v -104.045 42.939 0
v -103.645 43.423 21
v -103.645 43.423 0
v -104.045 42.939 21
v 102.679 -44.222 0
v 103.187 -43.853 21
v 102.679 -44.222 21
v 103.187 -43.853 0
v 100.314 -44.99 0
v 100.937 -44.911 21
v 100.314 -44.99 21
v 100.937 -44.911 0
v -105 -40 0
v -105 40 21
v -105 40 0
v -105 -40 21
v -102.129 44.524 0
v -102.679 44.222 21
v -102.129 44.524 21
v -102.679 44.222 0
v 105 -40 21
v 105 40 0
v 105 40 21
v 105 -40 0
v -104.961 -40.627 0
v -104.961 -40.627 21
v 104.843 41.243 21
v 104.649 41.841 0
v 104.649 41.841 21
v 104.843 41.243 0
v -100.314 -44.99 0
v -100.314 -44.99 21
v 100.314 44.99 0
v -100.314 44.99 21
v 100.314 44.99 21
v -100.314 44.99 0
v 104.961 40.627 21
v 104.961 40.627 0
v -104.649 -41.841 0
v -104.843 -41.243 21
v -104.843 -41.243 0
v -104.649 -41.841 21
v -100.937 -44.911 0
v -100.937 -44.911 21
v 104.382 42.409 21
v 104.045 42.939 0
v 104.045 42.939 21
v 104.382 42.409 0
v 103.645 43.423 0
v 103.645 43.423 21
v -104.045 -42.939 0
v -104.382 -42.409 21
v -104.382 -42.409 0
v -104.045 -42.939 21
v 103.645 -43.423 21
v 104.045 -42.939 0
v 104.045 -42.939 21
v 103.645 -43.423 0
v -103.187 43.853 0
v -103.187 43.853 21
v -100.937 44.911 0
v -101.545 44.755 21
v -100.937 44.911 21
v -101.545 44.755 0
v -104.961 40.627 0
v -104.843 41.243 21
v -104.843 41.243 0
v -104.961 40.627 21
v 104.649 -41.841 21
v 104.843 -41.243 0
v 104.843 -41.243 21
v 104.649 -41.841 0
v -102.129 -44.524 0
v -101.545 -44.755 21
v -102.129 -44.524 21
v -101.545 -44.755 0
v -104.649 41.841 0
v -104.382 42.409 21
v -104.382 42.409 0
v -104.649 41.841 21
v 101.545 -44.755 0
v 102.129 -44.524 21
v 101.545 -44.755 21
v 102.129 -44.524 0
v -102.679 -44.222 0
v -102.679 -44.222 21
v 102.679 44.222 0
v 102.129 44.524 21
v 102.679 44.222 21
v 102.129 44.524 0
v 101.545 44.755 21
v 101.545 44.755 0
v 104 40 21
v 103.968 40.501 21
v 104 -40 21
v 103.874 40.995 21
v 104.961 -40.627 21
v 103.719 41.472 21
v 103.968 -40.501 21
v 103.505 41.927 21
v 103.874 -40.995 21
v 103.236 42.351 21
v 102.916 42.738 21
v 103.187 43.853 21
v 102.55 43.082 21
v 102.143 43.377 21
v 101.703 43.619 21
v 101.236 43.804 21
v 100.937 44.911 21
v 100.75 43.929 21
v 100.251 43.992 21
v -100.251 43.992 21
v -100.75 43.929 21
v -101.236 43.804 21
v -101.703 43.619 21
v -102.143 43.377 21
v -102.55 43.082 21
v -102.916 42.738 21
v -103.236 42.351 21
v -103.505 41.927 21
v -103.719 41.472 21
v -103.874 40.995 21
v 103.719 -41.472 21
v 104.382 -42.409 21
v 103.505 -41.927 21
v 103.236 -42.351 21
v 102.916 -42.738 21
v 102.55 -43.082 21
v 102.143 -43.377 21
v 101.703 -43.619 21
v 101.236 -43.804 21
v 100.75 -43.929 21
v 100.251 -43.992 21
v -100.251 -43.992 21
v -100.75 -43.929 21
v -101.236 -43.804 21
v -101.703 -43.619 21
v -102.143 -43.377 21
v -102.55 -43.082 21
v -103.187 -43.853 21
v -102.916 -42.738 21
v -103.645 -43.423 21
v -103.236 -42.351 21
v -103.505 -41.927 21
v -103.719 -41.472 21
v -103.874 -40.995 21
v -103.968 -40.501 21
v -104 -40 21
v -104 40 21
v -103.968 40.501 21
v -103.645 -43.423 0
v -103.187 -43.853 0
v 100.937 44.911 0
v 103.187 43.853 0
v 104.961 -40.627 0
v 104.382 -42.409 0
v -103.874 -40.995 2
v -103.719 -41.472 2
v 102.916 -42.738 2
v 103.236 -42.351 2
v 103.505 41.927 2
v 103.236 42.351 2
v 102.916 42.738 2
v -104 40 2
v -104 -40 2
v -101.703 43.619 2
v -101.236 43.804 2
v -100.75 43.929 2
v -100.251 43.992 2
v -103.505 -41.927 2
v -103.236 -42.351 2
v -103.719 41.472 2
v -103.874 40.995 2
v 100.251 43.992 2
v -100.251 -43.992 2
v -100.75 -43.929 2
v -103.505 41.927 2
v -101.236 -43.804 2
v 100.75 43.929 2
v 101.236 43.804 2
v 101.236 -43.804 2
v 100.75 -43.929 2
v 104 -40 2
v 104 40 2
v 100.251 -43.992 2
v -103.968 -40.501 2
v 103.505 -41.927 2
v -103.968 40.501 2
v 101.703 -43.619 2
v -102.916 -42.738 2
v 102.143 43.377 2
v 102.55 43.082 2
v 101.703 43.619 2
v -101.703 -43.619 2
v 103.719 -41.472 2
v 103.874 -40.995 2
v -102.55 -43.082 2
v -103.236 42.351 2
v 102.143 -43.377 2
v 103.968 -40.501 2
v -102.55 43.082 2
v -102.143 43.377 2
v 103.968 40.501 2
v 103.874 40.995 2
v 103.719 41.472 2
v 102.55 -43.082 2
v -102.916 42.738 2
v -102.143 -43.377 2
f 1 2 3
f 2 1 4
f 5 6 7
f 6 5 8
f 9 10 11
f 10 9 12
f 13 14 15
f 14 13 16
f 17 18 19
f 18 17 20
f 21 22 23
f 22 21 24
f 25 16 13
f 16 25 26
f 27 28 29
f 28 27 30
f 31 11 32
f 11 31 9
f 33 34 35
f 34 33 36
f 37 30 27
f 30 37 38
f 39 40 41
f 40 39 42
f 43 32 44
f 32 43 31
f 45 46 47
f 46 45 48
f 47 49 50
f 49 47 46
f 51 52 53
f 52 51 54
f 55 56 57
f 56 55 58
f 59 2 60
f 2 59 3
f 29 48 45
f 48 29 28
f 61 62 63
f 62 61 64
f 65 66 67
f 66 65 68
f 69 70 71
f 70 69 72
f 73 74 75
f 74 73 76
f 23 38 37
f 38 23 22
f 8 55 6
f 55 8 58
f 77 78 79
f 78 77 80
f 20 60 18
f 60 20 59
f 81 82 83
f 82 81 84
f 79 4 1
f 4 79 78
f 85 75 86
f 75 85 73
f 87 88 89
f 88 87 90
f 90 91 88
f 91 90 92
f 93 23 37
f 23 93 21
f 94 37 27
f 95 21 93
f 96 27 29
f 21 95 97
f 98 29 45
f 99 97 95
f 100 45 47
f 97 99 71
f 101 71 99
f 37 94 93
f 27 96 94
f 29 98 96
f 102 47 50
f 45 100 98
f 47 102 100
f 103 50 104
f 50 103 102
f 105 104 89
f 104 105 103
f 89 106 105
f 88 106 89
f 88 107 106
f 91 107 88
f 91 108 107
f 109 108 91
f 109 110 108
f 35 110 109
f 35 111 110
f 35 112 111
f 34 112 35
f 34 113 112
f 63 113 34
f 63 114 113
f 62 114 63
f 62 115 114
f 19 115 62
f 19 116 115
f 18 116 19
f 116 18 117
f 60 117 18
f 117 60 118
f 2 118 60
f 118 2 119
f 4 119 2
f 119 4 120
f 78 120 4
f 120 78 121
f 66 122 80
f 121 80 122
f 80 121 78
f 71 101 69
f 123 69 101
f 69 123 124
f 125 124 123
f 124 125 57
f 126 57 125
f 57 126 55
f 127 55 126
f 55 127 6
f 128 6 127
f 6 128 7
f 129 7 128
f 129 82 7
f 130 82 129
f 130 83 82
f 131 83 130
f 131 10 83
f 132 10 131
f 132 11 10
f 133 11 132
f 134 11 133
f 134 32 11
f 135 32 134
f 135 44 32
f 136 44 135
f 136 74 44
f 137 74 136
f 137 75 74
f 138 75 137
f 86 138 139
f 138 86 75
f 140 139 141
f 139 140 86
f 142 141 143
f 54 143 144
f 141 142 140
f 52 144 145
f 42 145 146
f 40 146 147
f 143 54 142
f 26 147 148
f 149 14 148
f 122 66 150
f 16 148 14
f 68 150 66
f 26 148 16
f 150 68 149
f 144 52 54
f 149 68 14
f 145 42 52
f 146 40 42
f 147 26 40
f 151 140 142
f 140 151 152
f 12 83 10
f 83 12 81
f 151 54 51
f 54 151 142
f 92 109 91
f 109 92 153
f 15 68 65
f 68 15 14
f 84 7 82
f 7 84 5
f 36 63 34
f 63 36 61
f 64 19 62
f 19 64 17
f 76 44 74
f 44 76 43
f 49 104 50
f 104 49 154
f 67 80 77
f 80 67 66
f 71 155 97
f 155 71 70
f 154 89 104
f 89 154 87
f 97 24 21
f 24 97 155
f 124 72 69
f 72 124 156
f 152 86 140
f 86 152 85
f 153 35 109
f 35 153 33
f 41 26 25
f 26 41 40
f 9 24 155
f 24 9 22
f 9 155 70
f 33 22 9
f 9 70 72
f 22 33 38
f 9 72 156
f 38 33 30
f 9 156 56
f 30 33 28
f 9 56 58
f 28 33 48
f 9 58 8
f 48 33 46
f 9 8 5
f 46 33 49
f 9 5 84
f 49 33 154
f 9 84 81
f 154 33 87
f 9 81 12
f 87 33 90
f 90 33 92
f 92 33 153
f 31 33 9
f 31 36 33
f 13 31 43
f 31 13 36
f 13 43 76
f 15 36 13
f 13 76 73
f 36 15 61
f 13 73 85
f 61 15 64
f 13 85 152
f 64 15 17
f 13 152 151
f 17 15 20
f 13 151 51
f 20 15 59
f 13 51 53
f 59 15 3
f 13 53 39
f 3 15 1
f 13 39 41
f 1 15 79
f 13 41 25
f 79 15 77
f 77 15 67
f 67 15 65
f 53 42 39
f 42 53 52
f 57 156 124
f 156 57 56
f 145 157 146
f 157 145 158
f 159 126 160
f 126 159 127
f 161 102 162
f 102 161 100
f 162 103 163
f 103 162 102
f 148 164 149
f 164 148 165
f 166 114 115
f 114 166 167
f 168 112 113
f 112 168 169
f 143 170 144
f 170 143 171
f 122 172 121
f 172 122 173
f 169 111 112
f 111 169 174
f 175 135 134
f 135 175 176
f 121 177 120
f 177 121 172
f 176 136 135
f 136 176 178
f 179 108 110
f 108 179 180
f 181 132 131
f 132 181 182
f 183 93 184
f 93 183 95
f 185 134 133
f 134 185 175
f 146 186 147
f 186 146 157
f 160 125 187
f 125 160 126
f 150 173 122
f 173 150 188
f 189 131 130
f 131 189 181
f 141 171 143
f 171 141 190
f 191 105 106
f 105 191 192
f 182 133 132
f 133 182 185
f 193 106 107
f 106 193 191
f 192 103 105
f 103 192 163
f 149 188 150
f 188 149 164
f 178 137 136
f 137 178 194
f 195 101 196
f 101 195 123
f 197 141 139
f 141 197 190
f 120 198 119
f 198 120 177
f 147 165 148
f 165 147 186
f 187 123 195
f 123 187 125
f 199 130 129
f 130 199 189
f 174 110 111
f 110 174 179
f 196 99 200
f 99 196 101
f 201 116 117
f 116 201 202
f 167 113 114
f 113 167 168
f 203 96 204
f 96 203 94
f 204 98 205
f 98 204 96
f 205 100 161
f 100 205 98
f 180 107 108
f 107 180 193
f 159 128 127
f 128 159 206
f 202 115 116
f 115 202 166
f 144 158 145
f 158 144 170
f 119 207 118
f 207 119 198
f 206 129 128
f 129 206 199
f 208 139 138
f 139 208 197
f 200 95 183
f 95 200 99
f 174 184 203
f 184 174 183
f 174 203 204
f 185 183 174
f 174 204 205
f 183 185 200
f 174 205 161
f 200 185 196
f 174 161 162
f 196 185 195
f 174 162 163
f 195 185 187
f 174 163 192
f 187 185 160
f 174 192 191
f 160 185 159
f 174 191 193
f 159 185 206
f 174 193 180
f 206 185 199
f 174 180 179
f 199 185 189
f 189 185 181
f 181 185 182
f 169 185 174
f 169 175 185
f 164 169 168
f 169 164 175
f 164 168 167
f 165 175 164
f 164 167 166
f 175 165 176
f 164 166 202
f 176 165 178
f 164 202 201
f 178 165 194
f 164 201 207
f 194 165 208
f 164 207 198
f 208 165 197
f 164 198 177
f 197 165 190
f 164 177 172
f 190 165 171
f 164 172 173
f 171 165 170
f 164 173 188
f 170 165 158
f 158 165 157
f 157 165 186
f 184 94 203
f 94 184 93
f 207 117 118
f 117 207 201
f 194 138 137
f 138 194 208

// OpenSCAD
$fn = 50;


difference() {
	union() {
		hull() {
			translate(v = [-100.0000000000, 40.0000000000, 0]) {
				cylinder(h = 21, r = 5);
			}
			translate(v = [100.0000000000, 40.0000000000, 0]) {
				cylinder(h = 21, r = 5);
			}
			translate(v = [-100.0000000000, -40.0000000000, 0]) {
				cylinder(h = 21, r = 5);
			}
			translate(v = [100.0000000000, -40.0000000000, 0]) {
				cylinder(h = 21, r = 5);
			}
		}
	}
	union() {
		translate(v = [0, 0, 2]) {
			hull() {
				translate(v = [-100.0000000000, 40.0000000000, 0]) {
					cylinder(h = 19, r = 4);
				}
				translate(v = [100.0000000000, 40.0000000000, 0]) {
					cylinder(h = 19, r = 4);
				}
				translate(v = [-100.0000000000, -40.0000000000, 0]) {
					cylinder(h = 19, r = 4);
				}
				translate(v = [100.0000000000, -40.0000000000, 0]) {
					cylinder(h = 19, r = 4);
				}
			}
		}
	}
}
